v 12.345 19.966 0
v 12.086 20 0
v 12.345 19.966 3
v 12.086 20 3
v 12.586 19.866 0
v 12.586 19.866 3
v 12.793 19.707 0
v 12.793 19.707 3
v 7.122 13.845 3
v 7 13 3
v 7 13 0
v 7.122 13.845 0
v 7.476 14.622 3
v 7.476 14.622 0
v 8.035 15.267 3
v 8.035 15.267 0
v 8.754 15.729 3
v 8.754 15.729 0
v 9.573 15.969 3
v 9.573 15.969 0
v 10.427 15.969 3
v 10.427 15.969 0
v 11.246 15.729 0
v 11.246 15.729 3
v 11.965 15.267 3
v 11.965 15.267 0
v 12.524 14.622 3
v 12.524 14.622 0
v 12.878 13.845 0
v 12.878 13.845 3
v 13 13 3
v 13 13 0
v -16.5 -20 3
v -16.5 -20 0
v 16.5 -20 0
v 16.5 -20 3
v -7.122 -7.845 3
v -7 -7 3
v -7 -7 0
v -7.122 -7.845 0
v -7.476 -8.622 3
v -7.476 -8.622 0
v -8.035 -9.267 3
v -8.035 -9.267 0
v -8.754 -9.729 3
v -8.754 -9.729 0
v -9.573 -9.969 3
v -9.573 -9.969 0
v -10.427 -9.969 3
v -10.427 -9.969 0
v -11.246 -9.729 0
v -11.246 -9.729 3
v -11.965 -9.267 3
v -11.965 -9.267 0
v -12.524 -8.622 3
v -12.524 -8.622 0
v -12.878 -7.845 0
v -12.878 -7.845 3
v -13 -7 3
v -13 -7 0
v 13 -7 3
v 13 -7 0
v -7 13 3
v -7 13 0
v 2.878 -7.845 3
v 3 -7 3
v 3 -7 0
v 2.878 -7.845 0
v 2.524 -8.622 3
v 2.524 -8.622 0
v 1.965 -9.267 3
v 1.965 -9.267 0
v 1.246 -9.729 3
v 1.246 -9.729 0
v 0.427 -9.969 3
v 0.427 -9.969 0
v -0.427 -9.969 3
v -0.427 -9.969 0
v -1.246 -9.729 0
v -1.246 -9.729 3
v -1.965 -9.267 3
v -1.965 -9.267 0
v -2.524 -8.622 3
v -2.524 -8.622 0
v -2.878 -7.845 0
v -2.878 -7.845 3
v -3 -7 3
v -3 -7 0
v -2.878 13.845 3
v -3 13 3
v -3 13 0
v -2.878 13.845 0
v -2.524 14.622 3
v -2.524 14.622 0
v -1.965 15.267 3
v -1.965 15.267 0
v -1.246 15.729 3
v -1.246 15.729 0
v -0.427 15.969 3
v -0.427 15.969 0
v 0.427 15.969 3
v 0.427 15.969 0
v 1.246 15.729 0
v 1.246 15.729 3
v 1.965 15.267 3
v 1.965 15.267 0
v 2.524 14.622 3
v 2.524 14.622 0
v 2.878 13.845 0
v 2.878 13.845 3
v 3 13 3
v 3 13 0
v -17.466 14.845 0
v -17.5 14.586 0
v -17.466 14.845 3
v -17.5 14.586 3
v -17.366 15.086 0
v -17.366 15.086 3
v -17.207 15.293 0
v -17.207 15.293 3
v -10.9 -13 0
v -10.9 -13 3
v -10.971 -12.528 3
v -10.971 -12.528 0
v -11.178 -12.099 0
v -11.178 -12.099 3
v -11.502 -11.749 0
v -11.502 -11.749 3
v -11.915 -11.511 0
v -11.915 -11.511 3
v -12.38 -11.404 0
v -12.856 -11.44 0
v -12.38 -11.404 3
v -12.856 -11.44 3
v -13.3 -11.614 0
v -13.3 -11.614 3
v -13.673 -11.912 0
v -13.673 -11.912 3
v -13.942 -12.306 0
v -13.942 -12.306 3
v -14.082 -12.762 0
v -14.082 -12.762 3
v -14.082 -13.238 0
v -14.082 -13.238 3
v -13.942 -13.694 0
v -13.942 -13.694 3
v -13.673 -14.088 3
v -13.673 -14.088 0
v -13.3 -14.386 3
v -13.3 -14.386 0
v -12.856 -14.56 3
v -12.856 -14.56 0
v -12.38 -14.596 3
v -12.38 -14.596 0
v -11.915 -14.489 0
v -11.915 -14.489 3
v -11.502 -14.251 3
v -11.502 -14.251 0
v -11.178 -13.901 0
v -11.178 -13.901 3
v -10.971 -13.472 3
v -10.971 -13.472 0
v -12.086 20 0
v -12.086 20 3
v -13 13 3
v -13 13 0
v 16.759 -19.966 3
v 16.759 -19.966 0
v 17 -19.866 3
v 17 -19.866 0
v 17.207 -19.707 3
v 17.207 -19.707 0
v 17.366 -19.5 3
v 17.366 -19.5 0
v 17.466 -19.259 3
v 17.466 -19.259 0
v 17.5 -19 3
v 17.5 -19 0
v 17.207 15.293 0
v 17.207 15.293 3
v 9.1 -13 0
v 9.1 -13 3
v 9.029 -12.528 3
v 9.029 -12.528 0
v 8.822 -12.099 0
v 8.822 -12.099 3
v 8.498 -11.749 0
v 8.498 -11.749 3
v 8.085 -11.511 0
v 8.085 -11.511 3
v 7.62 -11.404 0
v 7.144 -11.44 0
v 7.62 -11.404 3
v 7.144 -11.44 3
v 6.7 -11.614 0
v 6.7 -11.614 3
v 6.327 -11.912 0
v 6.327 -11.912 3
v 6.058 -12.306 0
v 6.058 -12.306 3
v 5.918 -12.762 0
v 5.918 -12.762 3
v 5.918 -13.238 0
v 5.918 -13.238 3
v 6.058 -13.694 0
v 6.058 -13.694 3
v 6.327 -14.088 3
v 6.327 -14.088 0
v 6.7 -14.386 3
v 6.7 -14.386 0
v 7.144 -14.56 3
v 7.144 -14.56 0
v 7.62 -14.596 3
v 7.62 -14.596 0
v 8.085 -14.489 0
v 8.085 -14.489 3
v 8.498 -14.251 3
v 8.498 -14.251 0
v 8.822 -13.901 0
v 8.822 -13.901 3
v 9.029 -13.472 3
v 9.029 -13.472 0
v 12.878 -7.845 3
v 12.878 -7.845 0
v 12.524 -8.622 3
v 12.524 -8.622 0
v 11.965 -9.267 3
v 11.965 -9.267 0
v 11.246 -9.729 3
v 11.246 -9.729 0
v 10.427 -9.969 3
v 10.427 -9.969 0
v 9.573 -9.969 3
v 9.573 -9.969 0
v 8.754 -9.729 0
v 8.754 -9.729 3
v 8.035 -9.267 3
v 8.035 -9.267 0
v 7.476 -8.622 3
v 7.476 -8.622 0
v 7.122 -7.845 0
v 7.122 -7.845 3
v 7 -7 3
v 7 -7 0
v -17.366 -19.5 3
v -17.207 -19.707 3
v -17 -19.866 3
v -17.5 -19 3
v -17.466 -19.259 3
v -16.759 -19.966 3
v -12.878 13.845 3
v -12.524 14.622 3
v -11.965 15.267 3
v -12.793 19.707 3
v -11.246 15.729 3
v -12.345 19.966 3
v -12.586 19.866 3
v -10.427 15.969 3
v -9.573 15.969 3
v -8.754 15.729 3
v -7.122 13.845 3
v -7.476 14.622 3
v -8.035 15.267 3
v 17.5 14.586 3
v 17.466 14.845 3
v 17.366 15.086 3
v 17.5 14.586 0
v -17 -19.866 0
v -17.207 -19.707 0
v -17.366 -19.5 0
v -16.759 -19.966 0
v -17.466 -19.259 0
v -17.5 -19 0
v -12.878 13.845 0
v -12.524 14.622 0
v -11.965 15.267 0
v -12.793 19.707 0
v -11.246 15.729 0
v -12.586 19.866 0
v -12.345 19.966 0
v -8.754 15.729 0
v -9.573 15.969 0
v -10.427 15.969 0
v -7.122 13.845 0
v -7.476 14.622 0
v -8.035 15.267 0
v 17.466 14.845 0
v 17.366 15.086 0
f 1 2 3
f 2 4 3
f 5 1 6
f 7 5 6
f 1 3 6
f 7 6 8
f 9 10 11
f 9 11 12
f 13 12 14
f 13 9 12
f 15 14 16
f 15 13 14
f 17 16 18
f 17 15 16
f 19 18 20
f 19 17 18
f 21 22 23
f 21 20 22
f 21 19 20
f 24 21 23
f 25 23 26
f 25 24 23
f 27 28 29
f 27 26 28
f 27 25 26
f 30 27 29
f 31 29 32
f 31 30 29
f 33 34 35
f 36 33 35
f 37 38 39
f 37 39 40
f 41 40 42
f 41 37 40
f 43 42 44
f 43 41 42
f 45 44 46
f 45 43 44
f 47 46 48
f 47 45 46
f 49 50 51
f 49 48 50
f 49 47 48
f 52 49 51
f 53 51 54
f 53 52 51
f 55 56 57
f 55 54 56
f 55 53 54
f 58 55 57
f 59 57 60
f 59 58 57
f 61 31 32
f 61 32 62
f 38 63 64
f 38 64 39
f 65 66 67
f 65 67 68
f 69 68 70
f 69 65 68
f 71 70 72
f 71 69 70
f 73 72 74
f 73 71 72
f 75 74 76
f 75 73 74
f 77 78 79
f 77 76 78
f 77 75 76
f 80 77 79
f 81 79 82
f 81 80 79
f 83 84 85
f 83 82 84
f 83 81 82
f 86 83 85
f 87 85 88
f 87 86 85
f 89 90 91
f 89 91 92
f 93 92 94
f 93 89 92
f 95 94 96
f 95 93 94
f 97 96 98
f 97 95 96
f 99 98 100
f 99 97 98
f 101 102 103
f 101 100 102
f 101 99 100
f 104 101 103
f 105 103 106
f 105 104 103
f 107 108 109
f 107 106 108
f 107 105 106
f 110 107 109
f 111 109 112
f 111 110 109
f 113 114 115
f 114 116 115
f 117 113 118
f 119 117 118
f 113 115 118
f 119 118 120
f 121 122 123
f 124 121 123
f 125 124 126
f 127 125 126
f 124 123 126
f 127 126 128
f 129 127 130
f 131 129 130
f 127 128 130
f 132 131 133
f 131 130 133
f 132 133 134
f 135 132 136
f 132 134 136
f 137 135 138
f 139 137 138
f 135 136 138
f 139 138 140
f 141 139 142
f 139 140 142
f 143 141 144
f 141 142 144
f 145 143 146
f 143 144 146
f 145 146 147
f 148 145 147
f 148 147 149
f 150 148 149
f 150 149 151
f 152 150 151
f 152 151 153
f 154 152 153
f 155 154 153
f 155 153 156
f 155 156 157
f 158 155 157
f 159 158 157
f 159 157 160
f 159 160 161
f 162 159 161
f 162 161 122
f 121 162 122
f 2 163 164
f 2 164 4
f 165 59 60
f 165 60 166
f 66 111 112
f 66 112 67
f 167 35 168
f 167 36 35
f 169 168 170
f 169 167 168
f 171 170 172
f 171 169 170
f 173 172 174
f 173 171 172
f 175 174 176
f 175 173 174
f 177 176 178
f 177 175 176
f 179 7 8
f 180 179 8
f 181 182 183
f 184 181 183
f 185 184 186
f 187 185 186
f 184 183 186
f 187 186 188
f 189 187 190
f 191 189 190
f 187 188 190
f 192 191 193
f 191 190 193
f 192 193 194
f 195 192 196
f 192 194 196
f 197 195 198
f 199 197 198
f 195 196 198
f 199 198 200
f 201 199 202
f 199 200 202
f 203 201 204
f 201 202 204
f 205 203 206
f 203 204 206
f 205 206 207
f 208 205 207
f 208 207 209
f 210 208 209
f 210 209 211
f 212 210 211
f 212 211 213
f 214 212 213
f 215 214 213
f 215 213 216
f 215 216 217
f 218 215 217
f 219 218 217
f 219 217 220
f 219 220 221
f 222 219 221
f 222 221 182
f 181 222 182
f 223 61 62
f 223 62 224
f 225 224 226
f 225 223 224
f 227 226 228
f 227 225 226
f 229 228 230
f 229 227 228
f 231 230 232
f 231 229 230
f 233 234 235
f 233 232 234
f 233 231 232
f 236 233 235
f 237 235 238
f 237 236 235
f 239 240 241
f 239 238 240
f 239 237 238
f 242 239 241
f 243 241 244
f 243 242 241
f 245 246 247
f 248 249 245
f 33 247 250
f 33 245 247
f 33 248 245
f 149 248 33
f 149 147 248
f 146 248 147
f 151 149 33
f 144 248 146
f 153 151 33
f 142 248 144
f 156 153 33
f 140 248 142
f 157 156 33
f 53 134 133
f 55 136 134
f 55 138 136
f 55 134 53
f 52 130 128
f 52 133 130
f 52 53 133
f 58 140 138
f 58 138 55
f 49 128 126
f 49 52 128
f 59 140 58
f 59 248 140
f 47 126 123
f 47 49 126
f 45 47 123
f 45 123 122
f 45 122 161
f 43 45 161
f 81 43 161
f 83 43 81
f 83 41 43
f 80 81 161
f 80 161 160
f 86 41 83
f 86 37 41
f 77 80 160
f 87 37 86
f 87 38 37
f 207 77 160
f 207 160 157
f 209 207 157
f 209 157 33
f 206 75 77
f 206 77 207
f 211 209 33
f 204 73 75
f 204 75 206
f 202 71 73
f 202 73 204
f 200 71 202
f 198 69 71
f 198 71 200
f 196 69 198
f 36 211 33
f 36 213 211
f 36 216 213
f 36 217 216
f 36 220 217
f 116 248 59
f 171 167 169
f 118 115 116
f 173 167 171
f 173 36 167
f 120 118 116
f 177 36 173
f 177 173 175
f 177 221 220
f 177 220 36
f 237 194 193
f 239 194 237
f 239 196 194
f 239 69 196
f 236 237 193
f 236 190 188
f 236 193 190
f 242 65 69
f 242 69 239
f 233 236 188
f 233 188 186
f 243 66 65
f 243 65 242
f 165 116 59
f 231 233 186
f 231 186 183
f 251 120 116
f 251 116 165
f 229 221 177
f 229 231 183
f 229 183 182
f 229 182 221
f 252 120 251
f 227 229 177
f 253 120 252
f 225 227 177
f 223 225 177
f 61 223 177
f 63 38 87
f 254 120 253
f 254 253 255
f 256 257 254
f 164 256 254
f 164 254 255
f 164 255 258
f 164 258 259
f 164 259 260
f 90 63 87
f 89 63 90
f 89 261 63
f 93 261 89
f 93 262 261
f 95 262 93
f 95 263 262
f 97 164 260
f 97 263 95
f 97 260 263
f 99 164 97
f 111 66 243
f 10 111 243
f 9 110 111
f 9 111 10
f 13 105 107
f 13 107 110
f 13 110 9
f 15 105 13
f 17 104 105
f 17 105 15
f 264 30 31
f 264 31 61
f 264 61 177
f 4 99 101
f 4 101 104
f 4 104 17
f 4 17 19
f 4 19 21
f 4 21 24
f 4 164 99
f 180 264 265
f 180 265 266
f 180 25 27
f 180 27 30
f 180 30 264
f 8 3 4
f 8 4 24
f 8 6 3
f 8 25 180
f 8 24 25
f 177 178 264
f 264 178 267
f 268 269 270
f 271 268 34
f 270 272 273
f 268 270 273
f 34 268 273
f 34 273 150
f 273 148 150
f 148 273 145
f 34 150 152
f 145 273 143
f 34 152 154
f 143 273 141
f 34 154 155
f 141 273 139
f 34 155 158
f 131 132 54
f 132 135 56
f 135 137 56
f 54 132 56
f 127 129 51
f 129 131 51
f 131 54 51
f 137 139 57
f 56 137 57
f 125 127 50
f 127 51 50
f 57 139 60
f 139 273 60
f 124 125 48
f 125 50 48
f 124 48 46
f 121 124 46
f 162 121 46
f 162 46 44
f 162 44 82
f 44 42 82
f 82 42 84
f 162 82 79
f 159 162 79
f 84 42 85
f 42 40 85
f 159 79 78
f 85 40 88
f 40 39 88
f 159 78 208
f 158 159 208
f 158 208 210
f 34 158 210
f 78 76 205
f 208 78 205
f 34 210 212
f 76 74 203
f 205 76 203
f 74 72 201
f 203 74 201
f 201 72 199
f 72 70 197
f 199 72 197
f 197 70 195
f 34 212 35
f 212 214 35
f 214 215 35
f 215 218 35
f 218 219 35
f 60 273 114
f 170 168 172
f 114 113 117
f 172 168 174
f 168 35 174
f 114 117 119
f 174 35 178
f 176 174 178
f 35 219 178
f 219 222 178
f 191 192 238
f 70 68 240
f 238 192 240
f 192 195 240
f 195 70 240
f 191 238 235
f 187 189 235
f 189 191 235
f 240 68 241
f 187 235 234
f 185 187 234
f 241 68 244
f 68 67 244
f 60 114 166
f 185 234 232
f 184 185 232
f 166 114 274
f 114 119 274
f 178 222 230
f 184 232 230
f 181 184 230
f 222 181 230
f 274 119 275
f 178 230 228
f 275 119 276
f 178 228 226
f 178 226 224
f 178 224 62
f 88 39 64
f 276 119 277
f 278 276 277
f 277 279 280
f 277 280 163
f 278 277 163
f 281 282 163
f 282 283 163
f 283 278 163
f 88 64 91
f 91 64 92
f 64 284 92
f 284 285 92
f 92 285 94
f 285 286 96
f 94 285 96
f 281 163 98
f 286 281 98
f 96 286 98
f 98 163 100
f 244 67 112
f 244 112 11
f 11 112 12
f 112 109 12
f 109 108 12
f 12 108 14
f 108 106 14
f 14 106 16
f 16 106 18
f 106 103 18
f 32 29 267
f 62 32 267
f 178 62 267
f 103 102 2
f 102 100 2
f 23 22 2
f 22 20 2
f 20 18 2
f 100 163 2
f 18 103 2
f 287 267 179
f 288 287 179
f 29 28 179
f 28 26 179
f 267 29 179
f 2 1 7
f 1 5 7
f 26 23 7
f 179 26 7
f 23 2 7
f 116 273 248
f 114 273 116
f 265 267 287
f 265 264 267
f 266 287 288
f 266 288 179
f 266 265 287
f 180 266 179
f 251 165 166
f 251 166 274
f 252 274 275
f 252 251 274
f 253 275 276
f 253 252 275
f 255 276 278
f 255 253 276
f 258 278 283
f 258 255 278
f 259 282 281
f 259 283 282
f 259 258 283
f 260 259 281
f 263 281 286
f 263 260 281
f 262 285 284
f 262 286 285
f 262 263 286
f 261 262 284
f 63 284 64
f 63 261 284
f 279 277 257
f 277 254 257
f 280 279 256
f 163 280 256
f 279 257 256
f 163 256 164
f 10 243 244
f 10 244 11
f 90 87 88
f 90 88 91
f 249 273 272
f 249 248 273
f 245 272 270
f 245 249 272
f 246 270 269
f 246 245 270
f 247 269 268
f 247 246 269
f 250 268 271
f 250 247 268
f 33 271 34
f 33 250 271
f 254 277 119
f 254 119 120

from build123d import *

# Parameters (mm, degrees)
SKETCH_1_W          = 35
SKETCH_1_H          = 40
EXTRUDE_1_DEPTH     = 3
CHAMFER_1_SIZE      = 5
FILLET_1_R          = 1
SKETCH_2_R          = 1.6
CUT_EXTRUDE_1_DEPTH = 4
CUT_EXTRUDE_2_DEPTH = 4


with BuildPart() as part:
    # 草图1 → 凸台-拉伸1 (new body)
    with BuildSketch(Plane.XY):
        Rectangle(SKETCH_1_W, SKETCH_1_H)
    extrude(amount=EXTRUDE_1_DEPTH)

    # 倒角1
    chamfer_1_edges = [part.edges().sort_by_distance(p)[0] for p in [
        (-17.5, 20, 1.5),
        (17.5, 20, 1.5),
    ]]
    chamfer(chamfer_1_edges, length=CHAMFER_1_SIZE)

    # 圆角1
    fillet_1_edges = [part.edges().sort_by_distance(p)[0] for p in [
        (-17.5, 15, 1.5),
        (12.5, 20, 1.5),
        (-12.5, 20, 1.5),
        (17.5, 15, 1.5),
        (17.5, -20, 1.5),
        (-17.5, -20, 1.5),
    ]]
    fillet(fillet_1_edges, radius=FILLET_1_R)

    # 草图2 → 切除-拉伸1 (cut, through all)
    with BuildSketch(Plane.XY.offset(3)):
        with Locations((-12.5, -13)):
            Circle(SKETCH_2_R)
        with Locations((7.5, -13)):
            Circle(SKETCH_2_R)
    extrude(amount=-CUT_EXTRUDE_1_DEPTH, mode=Mode.SUBTRACT)

    # 草图3 → 切除-拉伸2 (cut, through all)
    with BuildSketch(Plane.XY.offset(3)):
        with BuildLine():
            Line((3, 13), (3, -7))
            ThreePointArc((3, -7), (0, -10), (-3, -7))
            Line((-3, -7), (-3, 13))
            ThreePointArc((-3, 13), (0, 16), (3, 13))
        make_face()
        with BuildLine():
            Line((-7, 13), (-7, -7))
            ThreePointArc((-7, -7), (-10, -10), (-13, -7))
            Line((-13, -7), (-13, 13))
            ThreePointArc((-13, 13), (-10, 16), (-7, 13))
        make_face()
        with BuildLine():
            Line((13, 13), (13, -7))
            ThreePointArc((13, -7), (10, -10), (7, -7))
            Line((7, -7), (7, 13))
            ThreePointArc((7, 13), (10, 16), (13, 13))
        make_face()
    extrude(amount=-CUT_EXTRUDE_2_DEPTH, mode=Mode.SUBTRACT)


solid = part.part
